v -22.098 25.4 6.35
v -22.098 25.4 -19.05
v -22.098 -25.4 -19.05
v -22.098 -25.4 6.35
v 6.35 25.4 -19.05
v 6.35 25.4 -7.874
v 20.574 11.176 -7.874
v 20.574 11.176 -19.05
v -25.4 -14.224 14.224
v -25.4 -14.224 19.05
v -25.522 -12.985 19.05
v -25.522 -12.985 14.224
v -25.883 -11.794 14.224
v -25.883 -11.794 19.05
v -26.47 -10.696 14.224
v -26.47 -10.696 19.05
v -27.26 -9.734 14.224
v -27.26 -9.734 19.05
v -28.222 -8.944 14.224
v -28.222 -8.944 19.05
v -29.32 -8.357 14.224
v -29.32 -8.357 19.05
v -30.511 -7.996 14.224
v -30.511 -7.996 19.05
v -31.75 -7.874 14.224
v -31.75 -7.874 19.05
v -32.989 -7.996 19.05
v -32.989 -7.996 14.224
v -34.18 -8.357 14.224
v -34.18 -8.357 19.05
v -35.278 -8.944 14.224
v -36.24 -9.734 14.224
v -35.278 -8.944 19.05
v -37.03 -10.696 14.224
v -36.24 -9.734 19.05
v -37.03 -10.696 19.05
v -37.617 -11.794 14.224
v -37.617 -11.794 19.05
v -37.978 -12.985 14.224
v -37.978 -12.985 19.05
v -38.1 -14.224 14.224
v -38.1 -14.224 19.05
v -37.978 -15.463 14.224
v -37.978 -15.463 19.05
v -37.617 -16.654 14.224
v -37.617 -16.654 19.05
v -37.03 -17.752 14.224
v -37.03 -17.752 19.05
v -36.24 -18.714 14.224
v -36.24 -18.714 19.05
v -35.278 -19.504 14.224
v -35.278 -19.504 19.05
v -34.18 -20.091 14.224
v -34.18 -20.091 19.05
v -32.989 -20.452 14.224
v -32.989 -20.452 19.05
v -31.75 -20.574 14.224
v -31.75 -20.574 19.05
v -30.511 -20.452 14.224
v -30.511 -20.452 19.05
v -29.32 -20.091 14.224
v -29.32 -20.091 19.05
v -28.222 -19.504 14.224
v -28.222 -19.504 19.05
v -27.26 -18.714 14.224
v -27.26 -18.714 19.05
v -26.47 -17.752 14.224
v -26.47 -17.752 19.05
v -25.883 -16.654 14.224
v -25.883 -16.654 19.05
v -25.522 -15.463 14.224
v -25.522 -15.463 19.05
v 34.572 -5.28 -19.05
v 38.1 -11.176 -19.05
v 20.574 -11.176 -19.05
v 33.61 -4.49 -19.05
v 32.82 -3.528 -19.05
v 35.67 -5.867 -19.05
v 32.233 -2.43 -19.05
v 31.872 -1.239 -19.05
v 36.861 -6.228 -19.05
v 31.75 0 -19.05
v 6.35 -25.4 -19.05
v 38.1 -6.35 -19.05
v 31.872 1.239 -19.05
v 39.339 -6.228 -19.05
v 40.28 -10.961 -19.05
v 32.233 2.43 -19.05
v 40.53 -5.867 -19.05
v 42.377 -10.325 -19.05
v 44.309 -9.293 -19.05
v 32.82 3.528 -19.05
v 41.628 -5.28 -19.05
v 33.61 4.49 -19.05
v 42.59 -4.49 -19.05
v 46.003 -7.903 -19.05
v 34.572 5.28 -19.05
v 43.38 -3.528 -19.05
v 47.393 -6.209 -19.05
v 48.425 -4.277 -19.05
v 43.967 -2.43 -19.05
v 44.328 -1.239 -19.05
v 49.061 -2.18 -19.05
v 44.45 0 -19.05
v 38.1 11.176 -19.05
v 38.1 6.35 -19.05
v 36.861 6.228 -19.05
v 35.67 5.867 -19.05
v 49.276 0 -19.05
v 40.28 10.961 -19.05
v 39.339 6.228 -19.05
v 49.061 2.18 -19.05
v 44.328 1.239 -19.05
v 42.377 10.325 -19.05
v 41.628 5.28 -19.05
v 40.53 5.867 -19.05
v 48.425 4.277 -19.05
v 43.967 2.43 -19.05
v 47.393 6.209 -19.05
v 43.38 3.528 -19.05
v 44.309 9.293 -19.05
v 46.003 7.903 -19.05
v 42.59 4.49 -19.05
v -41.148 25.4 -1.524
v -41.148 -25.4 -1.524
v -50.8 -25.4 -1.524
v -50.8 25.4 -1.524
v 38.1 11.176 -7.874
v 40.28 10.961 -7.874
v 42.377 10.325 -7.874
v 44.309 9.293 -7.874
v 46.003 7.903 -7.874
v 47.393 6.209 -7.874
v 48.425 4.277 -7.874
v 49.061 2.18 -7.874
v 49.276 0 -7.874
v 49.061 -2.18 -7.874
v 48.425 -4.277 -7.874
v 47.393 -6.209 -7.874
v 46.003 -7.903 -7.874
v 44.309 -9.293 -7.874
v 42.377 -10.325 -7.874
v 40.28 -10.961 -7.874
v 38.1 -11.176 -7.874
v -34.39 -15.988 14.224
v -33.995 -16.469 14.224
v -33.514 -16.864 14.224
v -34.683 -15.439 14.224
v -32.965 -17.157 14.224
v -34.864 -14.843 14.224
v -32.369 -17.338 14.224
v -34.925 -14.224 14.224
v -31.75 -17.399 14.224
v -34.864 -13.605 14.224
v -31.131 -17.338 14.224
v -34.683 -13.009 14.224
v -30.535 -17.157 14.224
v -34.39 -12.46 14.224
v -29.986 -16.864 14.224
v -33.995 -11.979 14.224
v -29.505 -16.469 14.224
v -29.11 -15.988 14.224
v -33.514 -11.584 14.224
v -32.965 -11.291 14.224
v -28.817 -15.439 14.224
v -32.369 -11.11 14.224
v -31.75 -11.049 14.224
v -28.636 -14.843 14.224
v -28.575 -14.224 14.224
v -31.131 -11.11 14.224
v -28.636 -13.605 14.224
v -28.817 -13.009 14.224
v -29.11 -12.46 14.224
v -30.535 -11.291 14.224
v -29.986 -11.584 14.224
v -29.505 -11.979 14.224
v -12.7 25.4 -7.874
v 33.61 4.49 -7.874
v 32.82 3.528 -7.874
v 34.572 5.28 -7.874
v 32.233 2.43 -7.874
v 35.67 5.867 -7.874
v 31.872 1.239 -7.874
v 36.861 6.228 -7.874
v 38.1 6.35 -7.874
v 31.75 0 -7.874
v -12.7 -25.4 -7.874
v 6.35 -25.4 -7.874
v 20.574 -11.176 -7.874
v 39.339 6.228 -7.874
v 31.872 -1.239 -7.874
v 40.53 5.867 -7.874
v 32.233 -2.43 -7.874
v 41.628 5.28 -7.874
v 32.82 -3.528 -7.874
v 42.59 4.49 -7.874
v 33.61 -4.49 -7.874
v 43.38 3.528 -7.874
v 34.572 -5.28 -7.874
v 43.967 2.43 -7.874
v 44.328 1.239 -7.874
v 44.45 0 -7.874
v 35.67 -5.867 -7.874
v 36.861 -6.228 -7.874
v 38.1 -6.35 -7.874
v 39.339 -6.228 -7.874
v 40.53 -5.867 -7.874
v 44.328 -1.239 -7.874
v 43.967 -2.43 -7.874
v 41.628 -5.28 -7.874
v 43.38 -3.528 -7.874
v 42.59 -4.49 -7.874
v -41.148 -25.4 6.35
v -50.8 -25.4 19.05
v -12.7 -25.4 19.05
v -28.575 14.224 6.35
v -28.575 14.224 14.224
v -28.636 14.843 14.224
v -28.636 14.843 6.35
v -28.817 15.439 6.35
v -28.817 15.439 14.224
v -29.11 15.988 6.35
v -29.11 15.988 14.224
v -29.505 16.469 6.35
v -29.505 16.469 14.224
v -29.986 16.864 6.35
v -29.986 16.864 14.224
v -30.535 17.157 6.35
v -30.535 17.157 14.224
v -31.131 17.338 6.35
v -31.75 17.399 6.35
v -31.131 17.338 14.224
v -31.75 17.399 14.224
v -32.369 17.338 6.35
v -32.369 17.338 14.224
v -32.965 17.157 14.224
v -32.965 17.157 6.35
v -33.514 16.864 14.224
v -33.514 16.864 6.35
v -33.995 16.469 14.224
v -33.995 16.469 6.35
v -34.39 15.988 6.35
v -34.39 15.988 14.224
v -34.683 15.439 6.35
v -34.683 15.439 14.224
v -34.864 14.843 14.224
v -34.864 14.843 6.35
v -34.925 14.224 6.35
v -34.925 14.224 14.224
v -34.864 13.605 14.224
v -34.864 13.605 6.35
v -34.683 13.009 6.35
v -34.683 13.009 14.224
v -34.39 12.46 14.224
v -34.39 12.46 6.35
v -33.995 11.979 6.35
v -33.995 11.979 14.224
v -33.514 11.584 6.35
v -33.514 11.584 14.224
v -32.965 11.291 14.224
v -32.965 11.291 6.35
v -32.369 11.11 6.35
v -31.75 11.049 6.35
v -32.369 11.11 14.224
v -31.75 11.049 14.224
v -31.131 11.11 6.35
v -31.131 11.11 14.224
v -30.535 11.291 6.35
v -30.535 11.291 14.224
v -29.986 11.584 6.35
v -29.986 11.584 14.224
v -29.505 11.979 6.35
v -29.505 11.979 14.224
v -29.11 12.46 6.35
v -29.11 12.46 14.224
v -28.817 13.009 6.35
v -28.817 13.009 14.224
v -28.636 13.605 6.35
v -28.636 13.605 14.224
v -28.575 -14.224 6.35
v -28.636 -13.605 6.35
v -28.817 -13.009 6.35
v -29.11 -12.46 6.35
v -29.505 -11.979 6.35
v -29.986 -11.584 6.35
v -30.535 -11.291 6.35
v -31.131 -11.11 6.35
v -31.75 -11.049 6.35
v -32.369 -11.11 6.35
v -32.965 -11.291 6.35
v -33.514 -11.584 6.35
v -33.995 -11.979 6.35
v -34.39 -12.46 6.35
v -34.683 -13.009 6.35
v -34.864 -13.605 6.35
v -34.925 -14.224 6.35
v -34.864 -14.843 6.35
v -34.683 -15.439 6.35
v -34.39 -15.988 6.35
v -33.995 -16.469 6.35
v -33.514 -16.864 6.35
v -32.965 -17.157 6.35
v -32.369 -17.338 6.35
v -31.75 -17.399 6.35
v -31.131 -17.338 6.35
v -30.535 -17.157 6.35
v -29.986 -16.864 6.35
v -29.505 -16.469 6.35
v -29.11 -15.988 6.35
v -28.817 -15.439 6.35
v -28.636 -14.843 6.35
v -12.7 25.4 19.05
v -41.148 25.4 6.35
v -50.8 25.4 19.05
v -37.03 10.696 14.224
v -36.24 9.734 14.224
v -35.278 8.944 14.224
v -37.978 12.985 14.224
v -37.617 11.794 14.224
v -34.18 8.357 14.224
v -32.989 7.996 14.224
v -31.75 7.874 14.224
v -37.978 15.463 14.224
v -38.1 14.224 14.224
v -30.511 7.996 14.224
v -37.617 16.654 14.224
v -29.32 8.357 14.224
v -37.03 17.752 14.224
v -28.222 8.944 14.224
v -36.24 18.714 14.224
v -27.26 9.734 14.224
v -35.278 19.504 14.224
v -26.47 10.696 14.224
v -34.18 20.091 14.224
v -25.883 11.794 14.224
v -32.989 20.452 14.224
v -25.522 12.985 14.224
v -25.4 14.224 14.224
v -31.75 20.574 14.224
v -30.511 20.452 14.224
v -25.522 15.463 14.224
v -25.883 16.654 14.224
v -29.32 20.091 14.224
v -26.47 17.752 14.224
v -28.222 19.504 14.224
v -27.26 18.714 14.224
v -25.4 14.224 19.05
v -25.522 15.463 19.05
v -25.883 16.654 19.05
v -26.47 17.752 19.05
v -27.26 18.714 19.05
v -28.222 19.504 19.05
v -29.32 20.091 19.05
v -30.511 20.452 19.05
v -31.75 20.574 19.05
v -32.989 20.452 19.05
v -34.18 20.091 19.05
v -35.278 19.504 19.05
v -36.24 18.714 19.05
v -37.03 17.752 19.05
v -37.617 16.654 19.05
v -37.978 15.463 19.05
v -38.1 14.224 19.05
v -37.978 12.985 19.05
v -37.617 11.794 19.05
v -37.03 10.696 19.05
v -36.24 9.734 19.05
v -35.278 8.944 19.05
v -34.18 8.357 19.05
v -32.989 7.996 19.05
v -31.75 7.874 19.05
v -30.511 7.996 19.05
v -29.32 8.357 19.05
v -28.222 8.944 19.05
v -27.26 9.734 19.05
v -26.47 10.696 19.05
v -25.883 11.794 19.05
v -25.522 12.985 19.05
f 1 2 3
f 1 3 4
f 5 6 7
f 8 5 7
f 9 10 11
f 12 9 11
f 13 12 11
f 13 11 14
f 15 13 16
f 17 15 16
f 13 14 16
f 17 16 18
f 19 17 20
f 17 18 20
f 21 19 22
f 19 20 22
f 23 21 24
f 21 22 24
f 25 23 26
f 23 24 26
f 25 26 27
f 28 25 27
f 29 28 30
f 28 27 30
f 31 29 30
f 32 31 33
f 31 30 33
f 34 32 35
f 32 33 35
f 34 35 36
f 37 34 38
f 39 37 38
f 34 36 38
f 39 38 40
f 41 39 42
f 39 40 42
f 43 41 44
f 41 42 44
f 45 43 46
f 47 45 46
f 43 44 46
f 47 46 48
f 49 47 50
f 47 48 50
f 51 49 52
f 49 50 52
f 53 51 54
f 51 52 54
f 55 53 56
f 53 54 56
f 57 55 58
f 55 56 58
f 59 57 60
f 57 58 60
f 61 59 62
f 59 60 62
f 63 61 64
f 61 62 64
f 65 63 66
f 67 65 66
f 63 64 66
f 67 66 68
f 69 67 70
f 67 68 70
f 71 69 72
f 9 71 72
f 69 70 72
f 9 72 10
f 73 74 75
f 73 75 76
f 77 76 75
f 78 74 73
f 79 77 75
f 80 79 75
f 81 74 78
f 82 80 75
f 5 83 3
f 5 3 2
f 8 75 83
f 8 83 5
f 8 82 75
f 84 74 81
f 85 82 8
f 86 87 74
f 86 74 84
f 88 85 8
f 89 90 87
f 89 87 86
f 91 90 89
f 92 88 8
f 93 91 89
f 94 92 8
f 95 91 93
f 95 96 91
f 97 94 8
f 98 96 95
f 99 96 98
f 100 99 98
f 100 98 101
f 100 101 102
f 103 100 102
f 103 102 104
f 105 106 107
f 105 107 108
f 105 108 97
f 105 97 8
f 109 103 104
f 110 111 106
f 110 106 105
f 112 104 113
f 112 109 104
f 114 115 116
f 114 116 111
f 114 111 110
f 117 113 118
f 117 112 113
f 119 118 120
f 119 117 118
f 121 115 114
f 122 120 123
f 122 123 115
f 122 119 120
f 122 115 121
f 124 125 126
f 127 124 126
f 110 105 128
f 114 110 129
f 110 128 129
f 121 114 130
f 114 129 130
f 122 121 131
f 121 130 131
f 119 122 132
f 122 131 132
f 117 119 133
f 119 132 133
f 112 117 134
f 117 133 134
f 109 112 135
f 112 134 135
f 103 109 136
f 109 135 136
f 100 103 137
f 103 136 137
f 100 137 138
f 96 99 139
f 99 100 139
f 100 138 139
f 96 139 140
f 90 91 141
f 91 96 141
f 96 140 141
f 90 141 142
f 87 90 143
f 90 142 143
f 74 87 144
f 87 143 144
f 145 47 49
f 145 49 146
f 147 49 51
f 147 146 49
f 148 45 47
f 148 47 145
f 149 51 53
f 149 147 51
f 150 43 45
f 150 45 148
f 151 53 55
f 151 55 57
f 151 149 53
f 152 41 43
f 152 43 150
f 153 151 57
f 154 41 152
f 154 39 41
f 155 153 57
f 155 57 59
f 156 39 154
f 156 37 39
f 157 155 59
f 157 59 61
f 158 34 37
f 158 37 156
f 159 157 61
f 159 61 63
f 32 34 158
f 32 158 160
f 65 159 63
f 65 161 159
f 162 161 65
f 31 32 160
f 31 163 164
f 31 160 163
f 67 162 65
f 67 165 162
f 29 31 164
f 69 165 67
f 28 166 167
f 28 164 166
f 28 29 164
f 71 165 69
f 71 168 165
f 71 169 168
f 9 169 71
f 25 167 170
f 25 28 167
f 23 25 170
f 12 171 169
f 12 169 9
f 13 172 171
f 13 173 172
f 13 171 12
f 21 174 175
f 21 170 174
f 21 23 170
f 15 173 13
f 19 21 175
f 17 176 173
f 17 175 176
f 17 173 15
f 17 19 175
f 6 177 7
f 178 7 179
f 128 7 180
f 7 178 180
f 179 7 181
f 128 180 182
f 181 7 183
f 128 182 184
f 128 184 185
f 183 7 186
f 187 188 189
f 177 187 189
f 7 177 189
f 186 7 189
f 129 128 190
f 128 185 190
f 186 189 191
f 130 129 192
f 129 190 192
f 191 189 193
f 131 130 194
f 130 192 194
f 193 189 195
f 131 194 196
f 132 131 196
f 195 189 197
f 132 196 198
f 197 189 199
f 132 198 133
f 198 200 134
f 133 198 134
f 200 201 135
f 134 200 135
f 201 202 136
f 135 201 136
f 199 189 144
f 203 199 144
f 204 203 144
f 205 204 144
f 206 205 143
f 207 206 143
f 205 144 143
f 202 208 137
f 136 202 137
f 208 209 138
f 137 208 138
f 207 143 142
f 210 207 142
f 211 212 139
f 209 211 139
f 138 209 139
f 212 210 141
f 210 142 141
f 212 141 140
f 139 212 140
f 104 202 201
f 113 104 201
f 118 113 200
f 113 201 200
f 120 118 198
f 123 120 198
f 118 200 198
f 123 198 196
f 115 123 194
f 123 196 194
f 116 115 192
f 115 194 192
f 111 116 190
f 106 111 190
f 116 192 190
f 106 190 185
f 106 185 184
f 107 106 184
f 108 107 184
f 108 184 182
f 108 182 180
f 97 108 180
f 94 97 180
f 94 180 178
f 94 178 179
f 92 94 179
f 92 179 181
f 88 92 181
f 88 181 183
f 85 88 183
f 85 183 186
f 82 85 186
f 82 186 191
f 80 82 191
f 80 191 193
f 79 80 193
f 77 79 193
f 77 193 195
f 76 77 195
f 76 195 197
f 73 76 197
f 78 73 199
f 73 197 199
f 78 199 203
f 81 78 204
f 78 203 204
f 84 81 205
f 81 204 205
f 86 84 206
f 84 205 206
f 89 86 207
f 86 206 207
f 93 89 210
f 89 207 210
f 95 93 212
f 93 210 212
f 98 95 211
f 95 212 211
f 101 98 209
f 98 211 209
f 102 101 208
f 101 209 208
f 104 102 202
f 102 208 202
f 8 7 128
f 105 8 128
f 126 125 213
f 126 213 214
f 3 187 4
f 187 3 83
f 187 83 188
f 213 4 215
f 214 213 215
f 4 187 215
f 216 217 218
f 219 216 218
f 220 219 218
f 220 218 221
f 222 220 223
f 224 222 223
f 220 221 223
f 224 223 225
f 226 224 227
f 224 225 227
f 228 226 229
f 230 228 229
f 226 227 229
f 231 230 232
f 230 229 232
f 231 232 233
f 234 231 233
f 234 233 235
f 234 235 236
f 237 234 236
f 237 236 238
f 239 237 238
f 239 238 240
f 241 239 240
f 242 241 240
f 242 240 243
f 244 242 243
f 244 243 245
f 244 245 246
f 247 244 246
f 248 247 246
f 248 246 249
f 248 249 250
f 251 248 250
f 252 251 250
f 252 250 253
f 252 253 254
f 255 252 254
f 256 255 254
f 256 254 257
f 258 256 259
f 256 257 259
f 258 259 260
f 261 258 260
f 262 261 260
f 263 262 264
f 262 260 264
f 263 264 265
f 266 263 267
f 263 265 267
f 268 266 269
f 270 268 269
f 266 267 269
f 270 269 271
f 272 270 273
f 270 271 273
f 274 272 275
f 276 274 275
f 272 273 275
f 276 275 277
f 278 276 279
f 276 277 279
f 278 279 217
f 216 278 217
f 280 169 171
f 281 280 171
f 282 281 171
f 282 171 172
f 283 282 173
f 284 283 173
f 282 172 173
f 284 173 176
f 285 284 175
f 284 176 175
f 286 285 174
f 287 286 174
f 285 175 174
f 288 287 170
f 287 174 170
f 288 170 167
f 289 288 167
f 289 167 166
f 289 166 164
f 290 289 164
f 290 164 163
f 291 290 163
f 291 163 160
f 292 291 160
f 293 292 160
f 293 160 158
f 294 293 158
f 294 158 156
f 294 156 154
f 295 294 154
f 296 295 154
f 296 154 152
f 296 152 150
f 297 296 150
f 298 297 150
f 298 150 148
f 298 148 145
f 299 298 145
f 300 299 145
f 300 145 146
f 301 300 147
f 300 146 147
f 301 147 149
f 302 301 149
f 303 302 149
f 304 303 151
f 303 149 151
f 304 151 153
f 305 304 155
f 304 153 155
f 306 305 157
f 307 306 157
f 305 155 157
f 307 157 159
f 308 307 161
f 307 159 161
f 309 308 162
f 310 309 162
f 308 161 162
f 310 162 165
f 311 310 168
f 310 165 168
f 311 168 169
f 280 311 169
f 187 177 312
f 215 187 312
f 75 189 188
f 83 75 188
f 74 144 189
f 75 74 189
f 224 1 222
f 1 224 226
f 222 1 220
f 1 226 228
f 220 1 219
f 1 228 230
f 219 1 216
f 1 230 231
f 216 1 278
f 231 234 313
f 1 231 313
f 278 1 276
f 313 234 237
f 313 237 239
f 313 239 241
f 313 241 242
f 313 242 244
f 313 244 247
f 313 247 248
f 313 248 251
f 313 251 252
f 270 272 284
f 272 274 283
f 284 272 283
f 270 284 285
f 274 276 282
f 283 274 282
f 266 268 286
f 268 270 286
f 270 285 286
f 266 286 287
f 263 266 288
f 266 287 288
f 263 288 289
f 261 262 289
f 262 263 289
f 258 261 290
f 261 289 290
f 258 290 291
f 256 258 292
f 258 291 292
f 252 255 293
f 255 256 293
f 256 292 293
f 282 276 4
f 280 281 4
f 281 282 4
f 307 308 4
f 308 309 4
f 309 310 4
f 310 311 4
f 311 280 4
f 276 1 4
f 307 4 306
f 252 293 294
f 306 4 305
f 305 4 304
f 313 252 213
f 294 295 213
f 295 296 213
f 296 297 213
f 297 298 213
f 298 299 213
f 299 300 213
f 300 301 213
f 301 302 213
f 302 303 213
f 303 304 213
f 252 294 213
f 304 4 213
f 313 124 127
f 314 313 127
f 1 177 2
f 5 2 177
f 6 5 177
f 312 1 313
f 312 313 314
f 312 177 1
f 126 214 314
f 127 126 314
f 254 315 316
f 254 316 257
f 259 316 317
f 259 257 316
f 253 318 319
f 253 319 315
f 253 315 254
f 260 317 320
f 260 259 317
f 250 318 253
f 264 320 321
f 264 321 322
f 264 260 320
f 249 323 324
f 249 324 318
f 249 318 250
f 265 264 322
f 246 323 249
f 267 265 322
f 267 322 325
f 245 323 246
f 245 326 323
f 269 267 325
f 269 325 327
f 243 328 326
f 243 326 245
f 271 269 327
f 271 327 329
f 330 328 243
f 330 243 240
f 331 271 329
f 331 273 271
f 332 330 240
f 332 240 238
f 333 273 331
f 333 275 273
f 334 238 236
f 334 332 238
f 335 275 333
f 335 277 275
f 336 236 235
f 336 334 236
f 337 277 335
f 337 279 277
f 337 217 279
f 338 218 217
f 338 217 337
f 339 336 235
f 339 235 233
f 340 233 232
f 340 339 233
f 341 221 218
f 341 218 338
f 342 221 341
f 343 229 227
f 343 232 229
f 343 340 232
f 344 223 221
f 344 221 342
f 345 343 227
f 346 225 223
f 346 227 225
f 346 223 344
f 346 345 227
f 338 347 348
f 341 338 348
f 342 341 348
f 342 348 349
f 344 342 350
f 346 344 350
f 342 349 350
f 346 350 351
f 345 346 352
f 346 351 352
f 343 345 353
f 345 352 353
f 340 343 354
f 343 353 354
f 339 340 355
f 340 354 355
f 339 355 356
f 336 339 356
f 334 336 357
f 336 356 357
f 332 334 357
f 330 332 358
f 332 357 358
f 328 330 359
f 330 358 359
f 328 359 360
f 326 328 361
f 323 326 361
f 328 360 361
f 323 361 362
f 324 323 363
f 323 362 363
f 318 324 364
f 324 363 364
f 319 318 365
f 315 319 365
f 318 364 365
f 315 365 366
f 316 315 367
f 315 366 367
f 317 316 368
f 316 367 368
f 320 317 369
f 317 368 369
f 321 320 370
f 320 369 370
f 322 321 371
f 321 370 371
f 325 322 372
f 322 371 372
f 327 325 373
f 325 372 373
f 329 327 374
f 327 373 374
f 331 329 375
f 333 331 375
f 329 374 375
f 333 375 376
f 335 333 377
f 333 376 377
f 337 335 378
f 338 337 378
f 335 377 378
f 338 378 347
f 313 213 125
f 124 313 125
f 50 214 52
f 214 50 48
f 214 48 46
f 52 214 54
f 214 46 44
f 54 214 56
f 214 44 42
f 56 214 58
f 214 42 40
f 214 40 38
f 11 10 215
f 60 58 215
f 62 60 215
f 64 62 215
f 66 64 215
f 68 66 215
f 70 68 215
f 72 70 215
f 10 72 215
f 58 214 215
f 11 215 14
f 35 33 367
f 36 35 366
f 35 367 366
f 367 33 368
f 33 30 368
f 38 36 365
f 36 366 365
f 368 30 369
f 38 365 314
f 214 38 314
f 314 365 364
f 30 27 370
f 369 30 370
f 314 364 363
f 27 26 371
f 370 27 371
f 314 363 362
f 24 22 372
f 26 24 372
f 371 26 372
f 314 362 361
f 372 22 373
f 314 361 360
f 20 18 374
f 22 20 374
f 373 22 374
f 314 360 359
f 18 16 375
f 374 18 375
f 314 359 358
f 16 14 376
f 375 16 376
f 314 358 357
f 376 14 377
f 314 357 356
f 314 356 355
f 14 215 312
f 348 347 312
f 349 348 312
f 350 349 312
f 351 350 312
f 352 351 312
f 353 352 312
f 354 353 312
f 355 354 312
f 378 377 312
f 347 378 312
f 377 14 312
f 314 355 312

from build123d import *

# Parameters (mm, degrees)
F0_W     = 50.8
F0_H     = 38.1
F1_DEPTH = 50.8
F2_R     = 3.175
F3_DEPTH = 38.101
F4_W     = 63.5
F4_H     = 26.924
F5_DEPTH = 50.801
F6_R     = 6.35
F7_DEPTH = 11.177
F8_R     = 6.35
F9_DEPTH = 4.826


with BuildPart() as f1:
    # F0 (on Right) → F1 (new body, symmetric)
    with BuildSketch(Plane.YZ):
        Rectangle(F0_W, F0_H)
    extrude(amount=F1_DEPTH, both=True)

    # F2 (on face) → F3 (cut, through all)
    with BuildSketch(Plane.XY.offset(19.05)):
        with Locations((-31.75, -14.224)):
            Circle(F2_R)
        with Locations((-31.75, 14.224)):
            Circle(F2_R)
    extrude(amount=-F3_DEPTH, mode=Mode.SUBTRACT)

    # F4 (on face) → F5 (cut, through all)
    with BuildSketch(Plane.XZ.offset(25.4)):
        Polygon((-41.148, -1.524), (-50.8, -1.524), (-50.8, -19.05), (-22.098, -19.05), (-22.098, 6.35), (-41.148, 6.35), align=None)
        with Locations((19.05, 5.588)):
            Rectangle(F4_W, F4_H)
    extrude(amount=-F5_DEPTH, mode=Mode.SUBTRACT)

    # F6 (on face) → F7 (cut, through all)
    with BuildSketch(Plane.XY.offset(-7.874)):
        with BuildLine():
            ThreePointArc((38.1, 11.176), (49.276, 0), (38.1, -11.176))
            Line((38.1, -11.176), (20.574, -11.176))
            Line((20.574, -11.176), (6.35, -25.4))
            Line((6.35, -25.4), (50.8, -25.4))
            Line((50.8, -25.4), (50.8, 25.4))
            Line((50.8, 25.4), (6.35, 25.4))
            Line((6.35, 25.4), (20.574, 11.176))
            Line((20.574, 11.176), (24.505507, 11.176))
            Line((24.505507, 11.176), (38.1, 11.176))
        make_face()
        with Locations((38.1, 0)):
            Circle(F6_R)
    extrude(amount=-F7_DEPTH, mode=Mode.SUBTRACT)

    # F8 (on face) → F9 (cut)
    with BuildSketch(Plane.XY.offset(19.05)):
        with Locations((-31.75, 14.224)):
            Circle(F8_R)
        with Locations((-31.75, -14.224)):
            Circle(F8_R)
    extrude(amount=-F9_DEPTH, mode=Mode.SUBTRACT)


solid = f1.part
